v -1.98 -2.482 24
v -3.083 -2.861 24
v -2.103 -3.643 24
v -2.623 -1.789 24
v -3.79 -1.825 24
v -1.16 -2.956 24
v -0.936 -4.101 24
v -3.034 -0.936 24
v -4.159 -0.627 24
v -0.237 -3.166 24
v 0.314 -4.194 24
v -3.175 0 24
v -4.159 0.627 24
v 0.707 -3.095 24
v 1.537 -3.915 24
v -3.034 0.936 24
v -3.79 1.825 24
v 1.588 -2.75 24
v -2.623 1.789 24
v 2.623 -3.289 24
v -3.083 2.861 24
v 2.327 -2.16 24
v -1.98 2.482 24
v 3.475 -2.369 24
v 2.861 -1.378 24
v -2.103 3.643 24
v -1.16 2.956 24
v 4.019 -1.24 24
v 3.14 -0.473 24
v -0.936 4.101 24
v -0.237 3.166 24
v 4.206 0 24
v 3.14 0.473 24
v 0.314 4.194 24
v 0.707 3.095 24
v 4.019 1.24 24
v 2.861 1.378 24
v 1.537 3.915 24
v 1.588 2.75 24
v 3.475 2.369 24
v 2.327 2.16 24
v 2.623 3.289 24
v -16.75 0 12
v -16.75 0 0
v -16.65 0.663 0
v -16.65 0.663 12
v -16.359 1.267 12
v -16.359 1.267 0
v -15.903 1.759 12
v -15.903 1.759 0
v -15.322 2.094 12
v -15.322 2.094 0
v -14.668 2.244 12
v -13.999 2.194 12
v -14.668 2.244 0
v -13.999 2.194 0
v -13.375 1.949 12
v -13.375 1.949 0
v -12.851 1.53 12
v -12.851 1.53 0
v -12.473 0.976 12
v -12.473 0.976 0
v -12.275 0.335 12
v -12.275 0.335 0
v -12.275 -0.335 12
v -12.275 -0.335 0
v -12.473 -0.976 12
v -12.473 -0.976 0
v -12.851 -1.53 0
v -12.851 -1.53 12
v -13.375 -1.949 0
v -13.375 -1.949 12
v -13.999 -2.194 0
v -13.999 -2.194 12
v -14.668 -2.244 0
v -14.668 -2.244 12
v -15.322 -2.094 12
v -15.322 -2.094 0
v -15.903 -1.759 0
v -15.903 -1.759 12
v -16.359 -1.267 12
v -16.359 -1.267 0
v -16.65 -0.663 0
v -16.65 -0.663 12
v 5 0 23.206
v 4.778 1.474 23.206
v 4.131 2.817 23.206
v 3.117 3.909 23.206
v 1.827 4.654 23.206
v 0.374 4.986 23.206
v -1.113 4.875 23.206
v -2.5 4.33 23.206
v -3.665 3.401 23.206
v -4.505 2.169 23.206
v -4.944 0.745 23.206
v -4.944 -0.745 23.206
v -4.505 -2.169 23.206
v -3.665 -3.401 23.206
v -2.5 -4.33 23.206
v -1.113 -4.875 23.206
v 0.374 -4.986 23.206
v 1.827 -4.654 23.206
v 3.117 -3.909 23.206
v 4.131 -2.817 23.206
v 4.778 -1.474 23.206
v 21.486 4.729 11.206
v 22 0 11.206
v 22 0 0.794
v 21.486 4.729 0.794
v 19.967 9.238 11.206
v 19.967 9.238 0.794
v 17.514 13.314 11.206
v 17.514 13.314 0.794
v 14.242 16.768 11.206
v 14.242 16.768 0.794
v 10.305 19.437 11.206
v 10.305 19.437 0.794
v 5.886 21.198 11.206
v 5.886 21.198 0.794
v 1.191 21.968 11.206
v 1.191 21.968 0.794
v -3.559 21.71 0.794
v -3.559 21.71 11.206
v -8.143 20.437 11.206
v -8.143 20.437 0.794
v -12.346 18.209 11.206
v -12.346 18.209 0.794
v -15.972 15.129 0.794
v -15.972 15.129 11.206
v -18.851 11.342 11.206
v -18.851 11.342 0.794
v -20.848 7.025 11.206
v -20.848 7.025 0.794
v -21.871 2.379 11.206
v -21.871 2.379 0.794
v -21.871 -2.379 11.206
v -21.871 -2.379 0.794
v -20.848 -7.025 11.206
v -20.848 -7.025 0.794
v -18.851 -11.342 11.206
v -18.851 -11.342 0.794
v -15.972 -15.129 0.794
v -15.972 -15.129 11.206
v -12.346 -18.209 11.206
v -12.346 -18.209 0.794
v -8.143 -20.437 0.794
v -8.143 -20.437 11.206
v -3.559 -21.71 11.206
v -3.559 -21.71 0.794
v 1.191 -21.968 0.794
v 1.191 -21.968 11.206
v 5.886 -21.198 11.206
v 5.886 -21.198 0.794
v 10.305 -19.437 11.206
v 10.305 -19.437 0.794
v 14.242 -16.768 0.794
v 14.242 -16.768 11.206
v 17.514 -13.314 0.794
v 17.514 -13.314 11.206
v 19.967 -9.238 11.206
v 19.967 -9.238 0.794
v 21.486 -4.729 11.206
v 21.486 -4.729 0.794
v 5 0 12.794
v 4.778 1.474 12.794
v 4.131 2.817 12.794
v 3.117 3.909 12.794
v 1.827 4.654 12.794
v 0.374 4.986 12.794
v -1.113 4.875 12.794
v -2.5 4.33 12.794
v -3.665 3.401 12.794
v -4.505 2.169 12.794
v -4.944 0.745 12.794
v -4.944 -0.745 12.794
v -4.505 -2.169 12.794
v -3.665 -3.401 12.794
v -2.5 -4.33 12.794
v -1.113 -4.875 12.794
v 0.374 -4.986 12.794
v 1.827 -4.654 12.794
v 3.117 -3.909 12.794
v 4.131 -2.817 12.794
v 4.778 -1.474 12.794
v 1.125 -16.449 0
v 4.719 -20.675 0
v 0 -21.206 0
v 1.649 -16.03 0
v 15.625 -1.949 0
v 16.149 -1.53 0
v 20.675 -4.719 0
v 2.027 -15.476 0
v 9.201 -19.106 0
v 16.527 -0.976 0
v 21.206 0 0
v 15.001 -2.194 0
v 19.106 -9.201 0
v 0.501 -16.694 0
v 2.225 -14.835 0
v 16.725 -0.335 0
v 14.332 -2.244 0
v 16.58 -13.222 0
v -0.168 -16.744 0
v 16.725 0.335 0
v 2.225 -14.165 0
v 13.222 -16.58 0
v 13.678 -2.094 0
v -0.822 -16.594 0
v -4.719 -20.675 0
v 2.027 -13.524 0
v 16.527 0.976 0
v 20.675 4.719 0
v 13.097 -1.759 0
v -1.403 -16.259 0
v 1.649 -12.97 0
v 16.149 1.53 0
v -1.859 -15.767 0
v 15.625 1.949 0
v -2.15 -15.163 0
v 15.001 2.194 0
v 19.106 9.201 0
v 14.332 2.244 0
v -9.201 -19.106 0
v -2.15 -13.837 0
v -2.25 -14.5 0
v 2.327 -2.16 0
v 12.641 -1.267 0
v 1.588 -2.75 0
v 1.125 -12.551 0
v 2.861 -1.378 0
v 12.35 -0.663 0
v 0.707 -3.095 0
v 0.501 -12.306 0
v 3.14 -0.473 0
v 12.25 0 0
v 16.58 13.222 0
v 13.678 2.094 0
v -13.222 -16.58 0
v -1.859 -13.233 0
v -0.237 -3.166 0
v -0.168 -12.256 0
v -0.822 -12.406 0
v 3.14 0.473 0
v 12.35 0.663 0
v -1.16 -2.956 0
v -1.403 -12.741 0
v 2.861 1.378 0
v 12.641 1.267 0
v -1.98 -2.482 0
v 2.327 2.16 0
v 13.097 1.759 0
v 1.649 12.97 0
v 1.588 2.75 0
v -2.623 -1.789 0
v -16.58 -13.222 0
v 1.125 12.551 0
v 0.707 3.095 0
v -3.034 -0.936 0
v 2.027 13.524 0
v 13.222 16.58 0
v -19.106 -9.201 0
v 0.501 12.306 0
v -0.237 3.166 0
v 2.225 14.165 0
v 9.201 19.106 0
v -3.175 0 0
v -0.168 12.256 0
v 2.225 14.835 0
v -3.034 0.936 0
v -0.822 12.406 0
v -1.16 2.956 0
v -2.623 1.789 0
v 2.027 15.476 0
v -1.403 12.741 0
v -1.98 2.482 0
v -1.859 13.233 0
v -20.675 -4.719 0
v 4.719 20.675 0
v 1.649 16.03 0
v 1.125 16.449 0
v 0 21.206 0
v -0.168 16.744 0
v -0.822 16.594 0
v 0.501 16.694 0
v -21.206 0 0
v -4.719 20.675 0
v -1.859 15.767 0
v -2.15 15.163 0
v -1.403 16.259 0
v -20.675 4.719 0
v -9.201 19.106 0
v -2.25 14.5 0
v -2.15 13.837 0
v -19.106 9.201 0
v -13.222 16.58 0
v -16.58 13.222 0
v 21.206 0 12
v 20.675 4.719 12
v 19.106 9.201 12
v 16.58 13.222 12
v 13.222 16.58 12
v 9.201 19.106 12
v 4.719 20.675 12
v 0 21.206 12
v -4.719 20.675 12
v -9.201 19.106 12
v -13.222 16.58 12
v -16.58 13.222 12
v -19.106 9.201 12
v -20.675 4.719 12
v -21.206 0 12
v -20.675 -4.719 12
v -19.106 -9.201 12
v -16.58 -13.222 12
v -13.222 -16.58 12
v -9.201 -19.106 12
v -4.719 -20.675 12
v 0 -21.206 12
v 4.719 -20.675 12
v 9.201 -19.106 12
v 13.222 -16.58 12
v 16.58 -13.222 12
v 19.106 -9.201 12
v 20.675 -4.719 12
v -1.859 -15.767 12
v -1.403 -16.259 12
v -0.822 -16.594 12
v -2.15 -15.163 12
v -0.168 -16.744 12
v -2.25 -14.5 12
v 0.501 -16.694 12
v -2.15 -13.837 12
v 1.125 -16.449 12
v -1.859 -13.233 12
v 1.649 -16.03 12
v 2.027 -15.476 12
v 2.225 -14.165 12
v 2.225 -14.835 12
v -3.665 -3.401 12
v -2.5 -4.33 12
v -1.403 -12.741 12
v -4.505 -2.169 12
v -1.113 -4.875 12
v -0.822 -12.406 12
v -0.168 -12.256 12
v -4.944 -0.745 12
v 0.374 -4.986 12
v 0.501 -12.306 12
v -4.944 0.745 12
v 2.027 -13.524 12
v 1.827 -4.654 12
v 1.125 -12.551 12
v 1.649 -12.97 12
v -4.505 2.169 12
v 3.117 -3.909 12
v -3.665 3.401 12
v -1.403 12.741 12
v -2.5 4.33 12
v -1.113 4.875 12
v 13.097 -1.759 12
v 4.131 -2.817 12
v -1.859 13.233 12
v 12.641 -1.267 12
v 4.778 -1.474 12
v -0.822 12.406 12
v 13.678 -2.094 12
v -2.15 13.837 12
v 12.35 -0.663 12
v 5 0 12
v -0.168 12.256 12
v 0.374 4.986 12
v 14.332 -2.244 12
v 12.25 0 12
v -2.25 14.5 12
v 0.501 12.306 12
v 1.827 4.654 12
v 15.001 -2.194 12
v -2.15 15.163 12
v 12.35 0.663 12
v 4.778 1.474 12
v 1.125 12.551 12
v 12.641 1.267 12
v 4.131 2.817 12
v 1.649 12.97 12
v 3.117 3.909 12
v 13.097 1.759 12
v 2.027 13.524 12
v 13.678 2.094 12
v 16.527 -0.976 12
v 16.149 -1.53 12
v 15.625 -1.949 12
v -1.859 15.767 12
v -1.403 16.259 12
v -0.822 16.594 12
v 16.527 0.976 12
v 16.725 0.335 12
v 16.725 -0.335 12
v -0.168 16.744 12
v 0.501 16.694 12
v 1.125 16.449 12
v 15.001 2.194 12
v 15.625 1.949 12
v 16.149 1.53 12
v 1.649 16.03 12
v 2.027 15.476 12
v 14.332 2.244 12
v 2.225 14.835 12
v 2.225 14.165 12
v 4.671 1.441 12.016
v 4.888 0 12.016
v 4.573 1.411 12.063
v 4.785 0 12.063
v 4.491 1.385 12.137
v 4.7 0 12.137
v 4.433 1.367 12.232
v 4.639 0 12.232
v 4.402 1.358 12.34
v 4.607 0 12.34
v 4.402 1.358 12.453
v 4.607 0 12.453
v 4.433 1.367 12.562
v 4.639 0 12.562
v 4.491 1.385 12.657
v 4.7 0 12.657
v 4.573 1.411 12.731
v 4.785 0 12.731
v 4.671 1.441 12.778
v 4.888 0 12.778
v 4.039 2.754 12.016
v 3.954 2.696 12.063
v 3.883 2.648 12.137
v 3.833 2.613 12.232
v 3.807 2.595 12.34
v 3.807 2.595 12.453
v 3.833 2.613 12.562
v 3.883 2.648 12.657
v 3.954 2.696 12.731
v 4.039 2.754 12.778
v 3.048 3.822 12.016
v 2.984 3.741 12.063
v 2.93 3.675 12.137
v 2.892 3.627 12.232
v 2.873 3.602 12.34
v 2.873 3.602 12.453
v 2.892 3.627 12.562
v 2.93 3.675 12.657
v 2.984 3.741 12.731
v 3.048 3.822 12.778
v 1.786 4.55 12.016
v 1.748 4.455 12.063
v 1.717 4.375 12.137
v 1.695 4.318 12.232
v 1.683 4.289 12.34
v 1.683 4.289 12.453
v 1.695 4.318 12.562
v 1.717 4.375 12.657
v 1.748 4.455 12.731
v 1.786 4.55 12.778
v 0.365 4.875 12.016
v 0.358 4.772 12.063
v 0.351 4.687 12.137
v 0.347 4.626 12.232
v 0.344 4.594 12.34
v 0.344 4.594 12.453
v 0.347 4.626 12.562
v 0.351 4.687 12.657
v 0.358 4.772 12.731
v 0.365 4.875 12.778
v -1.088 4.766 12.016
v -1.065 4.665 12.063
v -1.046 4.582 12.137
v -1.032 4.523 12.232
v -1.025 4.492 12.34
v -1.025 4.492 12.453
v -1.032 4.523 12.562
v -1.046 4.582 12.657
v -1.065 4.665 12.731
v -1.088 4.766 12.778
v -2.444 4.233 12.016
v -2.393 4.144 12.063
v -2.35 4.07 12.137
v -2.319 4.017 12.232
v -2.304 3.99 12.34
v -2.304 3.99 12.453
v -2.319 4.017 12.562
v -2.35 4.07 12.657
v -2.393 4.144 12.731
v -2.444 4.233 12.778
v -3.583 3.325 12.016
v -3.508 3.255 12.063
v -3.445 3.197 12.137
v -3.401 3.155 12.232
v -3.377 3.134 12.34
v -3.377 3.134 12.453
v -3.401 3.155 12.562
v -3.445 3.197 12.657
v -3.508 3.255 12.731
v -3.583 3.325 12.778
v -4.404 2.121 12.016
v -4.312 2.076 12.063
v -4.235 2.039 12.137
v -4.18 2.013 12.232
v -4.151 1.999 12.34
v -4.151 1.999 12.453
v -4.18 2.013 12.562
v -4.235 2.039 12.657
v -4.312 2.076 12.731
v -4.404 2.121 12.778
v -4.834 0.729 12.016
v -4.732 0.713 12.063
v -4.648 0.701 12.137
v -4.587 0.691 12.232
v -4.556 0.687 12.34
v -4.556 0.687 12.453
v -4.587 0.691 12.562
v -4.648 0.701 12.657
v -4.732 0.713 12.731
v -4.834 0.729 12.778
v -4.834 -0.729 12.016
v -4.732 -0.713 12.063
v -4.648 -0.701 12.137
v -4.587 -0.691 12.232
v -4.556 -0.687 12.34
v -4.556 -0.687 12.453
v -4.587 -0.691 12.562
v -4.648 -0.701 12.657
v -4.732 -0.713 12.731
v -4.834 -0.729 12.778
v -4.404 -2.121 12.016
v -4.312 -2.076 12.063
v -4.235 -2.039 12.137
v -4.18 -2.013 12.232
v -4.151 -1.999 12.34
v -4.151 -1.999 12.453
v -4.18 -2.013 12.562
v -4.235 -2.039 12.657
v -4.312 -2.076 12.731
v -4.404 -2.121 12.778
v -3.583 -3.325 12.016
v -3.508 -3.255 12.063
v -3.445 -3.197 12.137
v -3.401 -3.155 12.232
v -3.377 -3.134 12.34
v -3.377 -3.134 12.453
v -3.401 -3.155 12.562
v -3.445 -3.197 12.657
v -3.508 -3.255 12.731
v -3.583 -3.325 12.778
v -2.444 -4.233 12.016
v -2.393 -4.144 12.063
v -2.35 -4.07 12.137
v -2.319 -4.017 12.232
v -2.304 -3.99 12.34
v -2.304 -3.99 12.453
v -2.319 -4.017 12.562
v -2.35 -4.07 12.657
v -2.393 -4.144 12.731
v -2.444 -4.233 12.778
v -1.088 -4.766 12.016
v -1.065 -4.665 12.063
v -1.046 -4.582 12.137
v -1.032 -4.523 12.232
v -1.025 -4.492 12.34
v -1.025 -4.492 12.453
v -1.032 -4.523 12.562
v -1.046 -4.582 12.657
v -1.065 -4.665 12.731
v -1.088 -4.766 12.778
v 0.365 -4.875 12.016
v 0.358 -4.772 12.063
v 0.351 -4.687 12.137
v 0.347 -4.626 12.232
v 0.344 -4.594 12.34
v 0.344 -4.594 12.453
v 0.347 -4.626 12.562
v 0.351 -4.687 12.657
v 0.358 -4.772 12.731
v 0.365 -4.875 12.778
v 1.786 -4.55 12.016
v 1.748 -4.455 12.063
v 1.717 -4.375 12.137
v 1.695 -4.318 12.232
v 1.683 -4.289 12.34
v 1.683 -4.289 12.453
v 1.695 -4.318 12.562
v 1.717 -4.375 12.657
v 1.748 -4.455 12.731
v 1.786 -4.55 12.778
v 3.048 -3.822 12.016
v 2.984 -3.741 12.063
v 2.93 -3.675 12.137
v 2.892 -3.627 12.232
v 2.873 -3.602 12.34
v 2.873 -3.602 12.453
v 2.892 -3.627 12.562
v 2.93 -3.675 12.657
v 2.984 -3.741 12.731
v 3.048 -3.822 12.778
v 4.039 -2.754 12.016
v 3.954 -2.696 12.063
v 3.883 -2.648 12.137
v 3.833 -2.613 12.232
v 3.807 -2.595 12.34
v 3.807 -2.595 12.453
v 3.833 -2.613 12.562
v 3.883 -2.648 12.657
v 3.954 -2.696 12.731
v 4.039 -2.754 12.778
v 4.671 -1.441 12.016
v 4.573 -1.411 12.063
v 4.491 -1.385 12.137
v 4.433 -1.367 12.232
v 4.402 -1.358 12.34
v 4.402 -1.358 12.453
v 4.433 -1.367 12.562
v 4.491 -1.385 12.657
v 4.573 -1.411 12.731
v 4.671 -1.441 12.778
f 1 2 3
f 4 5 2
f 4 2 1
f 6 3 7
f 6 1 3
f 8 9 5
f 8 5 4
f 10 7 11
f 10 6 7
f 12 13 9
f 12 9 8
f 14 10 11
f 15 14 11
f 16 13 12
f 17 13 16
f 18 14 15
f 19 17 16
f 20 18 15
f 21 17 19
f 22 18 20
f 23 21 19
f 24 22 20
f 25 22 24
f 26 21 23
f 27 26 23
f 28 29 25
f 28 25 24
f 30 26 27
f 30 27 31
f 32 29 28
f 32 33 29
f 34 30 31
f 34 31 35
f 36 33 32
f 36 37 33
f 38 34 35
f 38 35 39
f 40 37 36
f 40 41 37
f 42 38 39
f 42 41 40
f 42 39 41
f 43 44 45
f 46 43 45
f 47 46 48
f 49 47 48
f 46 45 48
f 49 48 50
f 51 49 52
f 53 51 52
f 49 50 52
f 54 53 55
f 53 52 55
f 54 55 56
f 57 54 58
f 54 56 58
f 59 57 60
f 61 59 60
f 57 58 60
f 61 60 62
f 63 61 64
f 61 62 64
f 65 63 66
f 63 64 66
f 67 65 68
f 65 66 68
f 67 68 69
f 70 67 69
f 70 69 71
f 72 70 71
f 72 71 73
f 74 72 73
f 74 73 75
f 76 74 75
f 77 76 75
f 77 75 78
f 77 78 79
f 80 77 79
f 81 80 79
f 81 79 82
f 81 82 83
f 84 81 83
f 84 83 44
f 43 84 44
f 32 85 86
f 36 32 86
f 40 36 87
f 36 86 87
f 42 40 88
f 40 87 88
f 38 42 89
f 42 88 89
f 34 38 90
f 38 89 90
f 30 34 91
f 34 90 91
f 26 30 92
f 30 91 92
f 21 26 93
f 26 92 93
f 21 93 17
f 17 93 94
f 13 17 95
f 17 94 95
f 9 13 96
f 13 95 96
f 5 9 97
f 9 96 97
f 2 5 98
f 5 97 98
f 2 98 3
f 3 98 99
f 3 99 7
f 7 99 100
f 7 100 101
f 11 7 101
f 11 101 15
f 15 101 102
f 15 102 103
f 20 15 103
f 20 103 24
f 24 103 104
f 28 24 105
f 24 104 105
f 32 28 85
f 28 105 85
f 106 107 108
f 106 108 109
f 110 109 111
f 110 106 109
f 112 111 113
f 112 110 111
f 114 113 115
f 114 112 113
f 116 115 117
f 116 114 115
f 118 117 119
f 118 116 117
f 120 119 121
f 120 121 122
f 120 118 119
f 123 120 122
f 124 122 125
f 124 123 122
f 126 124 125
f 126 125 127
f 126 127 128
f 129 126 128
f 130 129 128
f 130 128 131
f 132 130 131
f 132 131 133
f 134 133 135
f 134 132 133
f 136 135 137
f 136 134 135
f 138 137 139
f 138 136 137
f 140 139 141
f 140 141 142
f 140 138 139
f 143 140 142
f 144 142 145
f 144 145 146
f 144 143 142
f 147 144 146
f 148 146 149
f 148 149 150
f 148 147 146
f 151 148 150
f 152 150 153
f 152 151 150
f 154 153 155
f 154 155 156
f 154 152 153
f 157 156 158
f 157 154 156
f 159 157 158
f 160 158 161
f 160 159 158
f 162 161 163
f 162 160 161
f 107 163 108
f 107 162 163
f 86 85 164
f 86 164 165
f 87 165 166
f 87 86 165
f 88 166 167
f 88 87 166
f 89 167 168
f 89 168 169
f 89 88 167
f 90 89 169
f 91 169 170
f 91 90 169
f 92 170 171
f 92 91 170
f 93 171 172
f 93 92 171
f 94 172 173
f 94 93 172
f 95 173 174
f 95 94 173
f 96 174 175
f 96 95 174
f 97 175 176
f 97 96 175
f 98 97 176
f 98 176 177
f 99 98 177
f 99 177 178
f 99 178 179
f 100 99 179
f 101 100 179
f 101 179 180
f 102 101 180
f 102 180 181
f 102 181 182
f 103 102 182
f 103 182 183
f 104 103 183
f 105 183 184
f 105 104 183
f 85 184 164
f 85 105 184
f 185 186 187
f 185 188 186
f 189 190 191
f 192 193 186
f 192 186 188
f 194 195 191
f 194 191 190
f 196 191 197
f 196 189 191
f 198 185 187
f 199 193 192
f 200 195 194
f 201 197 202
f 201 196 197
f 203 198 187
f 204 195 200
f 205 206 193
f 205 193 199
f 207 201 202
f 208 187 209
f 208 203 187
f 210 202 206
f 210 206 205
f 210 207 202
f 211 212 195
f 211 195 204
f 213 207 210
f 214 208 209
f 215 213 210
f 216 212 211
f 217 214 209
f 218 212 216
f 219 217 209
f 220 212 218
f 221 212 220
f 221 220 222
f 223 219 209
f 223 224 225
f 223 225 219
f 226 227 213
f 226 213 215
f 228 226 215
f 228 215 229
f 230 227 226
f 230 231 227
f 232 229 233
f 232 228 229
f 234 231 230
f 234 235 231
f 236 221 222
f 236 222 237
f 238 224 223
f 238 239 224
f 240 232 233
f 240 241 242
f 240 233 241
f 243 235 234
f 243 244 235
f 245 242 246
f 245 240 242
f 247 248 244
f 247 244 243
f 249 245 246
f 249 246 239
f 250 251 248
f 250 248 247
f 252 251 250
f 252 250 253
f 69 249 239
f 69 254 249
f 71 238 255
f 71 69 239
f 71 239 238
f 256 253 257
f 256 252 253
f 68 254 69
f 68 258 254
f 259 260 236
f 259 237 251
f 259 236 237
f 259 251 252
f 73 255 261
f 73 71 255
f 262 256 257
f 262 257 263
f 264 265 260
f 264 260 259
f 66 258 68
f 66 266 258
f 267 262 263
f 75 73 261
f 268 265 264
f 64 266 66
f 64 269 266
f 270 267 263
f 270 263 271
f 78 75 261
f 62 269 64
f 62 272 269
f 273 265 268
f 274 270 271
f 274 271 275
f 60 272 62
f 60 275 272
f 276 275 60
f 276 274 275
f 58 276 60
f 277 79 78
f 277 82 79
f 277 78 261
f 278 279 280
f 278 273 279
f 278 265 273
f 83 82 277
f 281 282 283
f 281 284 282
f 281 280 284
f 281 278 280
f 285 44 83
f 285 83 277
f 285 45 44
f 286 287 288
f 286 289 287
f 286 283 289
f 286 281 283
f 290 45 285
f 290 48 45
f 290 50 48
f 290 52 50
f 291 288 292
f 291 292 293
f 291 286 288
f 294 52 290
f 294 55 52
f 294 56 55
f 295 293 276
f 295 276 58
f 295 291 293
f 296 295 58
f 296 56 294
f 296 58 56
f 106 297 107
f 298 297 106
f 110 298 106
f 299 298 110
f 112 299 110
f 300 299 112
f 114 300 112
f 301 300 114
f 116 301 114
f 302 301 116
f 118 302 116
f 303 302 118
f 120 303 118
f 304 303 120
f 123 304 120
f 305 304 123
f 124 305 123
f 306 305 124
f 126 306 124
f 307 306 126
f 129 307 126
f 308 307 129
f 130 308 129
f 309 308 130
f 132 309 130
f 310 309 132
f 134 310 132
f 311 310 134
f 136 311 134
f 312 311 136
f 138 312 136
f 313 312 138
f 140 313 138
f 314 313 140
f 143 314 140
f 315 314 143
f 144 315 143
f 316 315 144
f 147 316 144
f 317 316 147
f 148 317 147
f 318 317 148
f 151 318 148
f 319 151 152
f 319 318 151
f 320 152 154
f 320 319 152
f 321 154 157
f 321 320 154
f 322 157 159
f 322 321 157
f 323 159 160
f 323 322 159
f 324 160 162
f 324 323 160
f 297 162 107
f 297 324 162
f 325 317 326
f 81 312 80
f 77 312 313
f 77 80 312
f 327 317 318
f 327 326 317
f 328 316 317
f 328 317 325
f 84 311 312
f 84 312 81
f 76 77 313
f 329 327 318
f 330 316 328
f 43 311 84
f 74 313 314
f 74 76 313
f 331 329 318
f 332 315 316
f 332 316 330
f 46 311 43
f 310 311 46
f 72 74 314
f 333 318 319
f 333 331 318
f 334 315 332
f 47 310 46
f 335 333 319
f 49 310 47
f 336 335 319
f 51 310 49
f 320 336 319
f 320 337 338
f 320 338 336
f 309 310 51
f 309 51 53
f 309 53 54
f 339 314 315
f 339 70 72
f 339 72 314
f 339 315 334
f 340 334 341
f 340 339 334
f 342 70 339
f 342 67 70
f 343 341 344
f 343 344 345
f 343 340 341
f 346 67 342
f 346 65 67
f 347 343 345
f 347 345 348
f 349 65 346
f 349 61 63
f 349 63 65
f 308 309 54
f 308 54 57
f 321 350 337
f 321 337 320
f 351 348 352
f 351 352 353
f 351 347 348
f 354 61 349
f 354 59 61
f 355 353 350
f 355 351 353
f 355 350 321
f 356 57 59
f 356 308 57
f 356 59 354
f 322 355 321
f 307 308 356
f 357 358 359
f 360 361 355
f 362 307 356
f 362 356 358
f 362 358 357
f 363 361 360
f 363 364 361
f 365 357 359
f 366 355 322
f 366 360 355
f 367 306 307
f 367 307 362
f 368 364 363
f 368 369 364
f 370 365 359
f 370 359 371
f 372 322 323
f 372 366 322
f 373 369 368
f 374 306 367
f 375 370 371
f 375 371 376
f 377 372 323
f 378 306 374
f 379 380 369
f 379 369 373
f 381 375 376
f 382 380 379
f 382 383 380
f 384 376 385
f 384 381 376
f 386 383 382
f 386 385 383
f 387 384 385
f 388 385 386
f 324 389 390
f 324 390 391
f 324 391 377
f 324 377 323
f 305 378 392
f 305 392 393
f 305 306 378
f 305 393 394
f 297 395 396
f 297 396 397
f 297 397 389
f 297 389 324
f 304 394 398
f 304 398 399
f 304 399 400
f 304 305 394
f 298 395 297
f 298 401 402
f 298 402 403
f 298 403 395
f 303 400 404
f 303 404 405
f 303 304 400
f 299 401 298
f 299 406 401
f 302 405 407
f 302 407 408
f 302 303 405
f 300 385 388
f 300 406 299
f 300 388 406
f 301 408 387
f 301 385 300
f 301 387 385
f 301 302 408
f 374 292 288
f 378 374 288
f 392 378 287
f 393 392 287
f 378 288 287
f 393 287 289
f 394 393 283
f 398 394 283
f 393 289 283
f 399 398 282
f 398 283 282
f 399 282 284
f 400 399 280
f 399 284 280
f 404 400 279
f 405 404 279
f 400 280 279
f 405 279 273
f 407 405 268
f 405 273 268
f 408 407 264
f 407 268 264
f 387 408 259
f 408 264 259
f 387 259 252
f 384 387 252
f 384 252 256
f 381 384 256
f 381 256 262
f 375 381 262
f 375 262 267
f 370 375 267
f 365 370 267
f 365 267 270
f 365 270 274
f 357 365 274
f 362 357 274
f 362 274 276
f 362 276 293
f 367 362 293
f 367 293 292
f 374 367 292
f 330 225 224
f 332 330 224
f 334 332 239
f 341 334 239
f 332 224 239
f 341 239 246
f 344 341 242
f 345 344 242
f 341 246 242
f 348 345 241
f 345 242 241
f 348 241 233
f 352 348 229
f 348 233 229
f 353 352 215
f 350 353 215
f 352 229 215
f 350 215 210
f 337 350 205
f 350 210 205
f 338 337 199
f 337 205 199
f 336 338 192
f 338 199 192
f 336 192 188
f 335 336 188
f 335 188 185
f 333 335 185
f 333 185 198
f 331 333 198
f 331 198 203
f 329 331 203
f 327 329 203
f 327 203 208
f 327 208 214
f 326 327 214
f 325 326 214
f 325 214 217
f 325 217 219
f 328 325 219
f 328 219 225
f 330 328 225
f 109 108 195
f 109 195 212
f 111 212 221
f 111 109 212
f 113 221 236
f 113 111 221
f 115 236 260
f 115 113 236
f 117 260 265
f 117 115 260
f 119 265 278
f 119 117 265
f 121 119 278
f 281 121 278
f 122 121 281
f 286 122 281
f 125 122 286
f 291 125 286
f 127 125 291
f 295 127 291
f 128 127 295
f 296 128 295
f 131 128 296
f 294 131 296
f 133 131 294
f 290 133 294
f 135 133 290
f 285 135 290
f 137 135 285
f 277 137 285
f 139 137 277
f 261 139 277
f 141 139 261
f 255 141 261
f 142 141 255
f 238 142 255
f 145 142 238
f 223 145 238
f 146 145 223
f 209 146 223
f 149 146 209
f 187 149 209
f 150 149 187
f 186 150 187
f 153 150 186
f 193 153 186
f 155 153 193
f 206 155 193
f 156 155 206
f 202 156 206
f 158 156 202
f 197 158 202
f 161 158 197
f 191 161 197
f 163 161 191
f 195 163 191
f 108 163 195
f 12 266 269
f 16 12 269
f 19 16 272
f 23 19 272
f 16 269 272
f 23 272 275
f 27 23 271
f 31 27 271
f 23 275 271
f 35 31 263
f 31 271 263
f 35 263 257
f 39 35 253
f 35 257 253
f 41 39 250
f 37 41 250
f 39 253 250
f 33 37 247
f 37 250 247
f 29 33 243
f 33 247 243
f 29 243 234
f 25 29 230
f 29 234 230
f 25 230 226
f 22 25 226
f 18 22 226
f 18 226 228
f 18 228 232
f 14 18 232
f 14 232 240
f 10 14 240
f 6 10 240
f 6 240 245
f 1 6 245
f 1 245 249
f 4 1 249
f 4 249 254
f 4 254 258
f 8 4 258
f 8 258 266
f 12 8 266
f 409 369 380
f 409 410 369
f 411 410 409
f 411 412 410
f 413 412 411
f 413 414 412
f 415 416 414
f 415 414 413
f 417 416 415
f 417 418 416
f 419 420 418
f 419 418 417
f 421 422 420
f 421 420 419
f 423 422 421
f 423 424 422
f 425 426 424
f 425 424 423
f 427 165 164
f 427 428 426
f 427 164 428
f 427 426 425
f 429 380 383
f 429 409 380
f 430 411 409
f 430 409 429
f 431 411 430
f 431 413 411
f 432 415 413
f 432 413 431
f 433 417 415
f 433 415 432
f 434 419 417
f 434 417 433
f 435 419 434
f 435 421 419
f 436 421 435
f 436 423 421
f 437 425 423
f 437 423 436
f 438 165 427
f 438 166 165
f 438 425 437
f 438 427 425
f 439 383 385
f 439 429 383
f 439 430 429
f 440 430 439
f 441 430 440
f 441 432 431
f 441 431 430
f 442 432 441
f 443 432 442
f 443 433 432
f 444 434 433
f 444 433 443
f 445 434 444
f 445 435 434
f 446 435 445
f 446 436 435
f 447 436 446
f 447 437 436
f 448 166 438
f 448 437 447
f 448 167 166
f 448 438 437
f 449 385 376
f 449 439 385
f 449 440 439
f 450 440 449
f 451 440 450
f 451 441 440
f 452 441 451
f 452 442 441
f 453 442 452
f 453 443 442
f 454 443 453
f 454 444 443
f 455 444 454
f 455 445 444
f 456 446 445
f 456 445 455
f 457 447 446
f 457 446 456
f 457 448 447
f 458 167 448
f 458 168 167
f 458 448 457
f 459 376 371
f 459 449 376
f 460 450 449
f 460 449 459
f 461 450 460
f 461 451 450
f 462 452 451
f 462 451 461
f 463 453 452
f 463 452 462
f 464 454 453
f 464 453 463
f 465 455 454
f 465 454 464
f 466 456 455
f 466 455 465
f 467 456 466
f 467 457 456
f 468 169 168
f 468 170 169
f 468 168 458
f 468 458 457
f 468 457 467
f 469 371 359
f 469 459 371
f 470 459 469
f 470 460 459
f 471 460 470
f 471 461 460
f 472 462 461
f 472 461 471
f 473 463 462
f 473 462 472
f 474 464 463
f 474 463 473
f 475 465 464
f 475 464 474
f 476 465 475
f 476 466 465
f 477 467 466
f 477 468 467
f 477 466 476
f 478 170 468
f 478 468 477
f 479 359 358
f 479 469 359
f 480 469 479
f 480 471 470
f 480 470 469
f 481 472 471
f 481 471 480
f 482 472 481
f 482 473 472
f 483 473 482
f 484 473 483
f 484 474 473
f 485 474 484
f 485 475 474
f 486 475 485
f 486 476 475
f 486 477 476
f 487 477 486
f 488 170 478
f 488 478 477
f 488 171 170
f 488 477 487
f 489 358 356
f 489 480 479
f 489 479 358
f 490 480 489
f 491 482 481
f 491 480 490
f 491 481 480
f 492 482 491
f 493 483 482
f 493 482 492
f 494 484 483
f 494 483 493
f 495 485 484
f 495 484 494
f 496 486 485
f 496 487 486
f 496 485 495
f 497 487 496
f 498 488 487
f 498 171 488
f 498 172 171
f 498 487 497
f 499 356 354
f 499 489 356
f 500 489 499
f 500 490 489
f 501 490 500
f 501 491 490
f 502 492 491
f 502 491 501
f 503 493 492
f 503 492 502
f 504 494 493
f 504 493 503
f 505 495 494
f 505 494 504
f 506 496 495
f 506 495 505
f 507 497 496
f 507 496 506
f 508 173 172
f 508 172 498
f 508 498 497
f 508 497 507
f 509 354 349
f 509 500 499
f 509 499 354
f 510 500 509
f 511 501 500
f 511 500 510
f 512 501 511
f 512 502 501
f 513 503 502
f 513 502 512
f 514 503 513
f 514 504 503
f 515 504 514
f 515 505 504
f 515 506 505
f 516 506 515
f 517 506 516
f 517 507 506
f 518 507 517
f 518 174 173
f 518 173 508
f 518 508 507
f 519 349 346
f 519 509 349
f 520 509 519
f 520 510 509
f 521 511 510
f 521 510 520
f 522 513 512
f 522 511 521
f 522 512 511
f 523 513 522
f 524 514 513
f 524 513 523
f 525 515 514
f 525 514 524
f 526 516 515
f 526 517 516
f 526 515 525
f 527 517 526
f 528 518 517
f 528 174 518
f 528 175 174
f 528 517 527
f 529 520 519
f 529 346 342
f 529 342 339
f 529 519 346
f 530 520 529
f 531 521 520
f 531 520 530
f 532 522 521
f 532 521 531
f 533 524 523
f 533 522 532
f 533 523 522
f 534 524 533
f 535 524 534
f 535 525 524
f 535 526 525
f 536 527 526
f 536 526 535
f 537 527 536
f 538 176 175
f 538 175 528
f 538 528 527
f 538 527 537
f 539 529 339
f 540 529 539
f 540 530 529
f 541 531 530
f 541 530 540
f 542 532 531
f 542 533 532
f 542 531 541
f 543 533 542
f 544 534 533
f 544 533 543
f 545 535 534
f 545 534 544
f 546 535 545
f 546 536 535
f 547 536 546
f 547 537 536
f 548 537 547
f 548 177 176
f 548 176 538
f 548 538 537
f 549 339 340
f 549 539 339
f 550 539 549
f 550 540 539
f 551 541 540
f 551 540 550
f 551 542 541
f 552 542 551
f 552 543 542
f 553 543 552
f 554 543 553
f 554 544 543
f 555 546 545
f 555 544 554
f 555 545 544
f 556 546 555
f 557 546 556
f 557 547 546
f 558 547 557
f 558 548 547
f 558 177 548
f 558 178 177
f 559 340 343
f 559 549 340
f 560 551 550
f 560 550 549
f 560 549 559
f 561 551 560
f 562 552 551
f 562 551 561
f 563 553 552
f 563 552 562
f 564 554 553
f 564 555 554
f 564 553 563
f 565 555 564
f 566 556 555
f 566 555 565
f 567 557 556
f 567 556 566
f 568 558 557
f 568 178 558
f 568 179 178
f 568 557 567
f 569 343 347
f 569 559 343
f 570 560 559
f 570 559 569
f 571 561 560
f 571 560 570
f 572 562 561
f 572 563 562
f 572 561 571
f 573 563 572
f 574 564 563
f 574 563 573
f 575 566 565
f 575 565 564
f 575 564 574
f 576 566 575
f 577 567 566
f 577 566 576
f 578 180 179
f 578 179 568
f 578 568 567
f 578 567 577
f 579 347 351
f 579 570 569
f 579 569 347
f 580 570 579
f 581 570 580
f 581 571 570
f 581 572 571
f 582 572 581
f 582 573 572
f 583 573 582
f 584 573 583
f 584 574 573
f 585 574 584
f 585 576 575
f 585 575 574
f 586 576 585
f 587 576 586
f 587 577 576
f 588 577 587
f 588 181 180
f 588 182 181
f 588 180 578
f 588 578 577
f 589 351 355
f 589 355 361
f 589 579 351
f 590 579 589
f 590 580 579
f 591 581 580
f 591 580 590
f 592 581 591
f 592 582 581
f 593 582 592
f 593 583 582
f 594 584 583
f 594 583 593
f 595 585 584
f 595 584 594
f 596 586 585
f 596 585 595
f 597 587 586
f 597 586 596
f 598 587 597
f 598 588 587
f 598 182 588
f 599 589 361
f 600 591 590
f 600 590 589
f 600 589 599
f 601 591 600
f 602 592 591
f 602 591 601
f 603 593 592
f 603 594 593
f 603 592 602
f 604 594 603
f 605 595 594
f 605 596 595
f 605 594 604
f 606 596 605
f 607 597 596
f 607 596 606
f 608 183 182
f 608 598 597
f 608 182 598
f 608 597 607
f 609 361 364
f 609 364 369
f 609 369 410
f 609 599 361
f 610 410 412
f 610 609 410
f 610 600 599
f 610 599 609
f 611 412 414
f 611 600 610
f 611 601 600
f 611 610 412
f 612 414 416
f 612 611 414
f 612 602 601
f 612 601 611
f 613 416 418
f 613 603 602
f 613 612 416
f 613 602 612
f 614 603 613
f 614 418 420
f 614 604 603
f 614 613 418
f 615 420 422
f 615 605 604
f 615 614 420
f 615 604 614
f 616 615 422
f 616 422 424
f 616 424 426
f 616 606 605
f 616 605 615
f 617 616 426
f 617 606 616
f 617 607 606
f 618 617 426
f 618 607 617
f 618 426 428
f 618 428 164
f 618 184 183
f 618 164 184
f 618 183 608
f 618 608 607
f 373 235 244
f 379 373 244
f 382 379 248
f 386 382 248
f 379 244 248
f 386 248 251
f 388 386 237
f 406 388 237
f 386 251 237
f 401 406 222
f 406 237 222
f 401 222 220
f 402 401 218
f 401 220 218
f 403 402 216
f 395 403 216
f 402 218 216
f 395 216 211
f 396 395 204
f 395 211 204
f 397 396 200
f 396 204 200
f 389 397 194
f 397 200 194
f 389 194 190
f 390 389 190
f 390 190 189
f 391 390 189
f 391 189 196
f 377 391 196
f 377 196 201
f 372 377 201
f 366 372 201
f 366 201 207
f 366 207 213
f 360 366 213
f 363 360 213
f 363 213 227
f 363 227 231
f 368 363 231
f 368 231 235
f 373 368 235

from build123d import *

# Parameters (mm, degrees)
F3_D    = 6.35
F5_D    = 4.5
F6_SIZE = 0.79375


with BuildPart() as f1:
    # F0 (on Front) → F1 (revolve)
    with BuildSketch(Plane.XZ):
        with BuildLine():
            Line((0, 24), (0, 0))
            Line((0, 0), (22, 0))
            Line((22, 0), (22, 12))
            Line((22, 12), (5, 12))
            ThreePointArc((5, 12), (4.603125, 12.396875), (5, 12.79375))
            Line((5, 12.79375), (5, 24))
            Line((5, 24), (0, 24))
        make_face()
    revolve(axis=Axis((0, 0, 12), (0, 0, 1)))

    # F3 (through all)
    with Locations(Plane.XY.offset(24)):
        with Locations((0, 0)):
            Hole(F3_D / 2)

    # F5 (through all)
    with Locations(Plane.XY.offset(12)):
        with Locations((0, 14.5), (-14.5, 0), (0, -14.5), (14.5, 0)):
            Hole(F5_D / 2)

    # F6
    f6_edges = [f1.edges().sort_by_distance(p)[0] for p in [
        (-22, 0, 12),
        (-22, 0, 0),
        (22, 0, 6),
        (-5, 0, 24),
    ]]
    chamfer(f6_edges, length=F6_SIZE)


solid = f1.part
